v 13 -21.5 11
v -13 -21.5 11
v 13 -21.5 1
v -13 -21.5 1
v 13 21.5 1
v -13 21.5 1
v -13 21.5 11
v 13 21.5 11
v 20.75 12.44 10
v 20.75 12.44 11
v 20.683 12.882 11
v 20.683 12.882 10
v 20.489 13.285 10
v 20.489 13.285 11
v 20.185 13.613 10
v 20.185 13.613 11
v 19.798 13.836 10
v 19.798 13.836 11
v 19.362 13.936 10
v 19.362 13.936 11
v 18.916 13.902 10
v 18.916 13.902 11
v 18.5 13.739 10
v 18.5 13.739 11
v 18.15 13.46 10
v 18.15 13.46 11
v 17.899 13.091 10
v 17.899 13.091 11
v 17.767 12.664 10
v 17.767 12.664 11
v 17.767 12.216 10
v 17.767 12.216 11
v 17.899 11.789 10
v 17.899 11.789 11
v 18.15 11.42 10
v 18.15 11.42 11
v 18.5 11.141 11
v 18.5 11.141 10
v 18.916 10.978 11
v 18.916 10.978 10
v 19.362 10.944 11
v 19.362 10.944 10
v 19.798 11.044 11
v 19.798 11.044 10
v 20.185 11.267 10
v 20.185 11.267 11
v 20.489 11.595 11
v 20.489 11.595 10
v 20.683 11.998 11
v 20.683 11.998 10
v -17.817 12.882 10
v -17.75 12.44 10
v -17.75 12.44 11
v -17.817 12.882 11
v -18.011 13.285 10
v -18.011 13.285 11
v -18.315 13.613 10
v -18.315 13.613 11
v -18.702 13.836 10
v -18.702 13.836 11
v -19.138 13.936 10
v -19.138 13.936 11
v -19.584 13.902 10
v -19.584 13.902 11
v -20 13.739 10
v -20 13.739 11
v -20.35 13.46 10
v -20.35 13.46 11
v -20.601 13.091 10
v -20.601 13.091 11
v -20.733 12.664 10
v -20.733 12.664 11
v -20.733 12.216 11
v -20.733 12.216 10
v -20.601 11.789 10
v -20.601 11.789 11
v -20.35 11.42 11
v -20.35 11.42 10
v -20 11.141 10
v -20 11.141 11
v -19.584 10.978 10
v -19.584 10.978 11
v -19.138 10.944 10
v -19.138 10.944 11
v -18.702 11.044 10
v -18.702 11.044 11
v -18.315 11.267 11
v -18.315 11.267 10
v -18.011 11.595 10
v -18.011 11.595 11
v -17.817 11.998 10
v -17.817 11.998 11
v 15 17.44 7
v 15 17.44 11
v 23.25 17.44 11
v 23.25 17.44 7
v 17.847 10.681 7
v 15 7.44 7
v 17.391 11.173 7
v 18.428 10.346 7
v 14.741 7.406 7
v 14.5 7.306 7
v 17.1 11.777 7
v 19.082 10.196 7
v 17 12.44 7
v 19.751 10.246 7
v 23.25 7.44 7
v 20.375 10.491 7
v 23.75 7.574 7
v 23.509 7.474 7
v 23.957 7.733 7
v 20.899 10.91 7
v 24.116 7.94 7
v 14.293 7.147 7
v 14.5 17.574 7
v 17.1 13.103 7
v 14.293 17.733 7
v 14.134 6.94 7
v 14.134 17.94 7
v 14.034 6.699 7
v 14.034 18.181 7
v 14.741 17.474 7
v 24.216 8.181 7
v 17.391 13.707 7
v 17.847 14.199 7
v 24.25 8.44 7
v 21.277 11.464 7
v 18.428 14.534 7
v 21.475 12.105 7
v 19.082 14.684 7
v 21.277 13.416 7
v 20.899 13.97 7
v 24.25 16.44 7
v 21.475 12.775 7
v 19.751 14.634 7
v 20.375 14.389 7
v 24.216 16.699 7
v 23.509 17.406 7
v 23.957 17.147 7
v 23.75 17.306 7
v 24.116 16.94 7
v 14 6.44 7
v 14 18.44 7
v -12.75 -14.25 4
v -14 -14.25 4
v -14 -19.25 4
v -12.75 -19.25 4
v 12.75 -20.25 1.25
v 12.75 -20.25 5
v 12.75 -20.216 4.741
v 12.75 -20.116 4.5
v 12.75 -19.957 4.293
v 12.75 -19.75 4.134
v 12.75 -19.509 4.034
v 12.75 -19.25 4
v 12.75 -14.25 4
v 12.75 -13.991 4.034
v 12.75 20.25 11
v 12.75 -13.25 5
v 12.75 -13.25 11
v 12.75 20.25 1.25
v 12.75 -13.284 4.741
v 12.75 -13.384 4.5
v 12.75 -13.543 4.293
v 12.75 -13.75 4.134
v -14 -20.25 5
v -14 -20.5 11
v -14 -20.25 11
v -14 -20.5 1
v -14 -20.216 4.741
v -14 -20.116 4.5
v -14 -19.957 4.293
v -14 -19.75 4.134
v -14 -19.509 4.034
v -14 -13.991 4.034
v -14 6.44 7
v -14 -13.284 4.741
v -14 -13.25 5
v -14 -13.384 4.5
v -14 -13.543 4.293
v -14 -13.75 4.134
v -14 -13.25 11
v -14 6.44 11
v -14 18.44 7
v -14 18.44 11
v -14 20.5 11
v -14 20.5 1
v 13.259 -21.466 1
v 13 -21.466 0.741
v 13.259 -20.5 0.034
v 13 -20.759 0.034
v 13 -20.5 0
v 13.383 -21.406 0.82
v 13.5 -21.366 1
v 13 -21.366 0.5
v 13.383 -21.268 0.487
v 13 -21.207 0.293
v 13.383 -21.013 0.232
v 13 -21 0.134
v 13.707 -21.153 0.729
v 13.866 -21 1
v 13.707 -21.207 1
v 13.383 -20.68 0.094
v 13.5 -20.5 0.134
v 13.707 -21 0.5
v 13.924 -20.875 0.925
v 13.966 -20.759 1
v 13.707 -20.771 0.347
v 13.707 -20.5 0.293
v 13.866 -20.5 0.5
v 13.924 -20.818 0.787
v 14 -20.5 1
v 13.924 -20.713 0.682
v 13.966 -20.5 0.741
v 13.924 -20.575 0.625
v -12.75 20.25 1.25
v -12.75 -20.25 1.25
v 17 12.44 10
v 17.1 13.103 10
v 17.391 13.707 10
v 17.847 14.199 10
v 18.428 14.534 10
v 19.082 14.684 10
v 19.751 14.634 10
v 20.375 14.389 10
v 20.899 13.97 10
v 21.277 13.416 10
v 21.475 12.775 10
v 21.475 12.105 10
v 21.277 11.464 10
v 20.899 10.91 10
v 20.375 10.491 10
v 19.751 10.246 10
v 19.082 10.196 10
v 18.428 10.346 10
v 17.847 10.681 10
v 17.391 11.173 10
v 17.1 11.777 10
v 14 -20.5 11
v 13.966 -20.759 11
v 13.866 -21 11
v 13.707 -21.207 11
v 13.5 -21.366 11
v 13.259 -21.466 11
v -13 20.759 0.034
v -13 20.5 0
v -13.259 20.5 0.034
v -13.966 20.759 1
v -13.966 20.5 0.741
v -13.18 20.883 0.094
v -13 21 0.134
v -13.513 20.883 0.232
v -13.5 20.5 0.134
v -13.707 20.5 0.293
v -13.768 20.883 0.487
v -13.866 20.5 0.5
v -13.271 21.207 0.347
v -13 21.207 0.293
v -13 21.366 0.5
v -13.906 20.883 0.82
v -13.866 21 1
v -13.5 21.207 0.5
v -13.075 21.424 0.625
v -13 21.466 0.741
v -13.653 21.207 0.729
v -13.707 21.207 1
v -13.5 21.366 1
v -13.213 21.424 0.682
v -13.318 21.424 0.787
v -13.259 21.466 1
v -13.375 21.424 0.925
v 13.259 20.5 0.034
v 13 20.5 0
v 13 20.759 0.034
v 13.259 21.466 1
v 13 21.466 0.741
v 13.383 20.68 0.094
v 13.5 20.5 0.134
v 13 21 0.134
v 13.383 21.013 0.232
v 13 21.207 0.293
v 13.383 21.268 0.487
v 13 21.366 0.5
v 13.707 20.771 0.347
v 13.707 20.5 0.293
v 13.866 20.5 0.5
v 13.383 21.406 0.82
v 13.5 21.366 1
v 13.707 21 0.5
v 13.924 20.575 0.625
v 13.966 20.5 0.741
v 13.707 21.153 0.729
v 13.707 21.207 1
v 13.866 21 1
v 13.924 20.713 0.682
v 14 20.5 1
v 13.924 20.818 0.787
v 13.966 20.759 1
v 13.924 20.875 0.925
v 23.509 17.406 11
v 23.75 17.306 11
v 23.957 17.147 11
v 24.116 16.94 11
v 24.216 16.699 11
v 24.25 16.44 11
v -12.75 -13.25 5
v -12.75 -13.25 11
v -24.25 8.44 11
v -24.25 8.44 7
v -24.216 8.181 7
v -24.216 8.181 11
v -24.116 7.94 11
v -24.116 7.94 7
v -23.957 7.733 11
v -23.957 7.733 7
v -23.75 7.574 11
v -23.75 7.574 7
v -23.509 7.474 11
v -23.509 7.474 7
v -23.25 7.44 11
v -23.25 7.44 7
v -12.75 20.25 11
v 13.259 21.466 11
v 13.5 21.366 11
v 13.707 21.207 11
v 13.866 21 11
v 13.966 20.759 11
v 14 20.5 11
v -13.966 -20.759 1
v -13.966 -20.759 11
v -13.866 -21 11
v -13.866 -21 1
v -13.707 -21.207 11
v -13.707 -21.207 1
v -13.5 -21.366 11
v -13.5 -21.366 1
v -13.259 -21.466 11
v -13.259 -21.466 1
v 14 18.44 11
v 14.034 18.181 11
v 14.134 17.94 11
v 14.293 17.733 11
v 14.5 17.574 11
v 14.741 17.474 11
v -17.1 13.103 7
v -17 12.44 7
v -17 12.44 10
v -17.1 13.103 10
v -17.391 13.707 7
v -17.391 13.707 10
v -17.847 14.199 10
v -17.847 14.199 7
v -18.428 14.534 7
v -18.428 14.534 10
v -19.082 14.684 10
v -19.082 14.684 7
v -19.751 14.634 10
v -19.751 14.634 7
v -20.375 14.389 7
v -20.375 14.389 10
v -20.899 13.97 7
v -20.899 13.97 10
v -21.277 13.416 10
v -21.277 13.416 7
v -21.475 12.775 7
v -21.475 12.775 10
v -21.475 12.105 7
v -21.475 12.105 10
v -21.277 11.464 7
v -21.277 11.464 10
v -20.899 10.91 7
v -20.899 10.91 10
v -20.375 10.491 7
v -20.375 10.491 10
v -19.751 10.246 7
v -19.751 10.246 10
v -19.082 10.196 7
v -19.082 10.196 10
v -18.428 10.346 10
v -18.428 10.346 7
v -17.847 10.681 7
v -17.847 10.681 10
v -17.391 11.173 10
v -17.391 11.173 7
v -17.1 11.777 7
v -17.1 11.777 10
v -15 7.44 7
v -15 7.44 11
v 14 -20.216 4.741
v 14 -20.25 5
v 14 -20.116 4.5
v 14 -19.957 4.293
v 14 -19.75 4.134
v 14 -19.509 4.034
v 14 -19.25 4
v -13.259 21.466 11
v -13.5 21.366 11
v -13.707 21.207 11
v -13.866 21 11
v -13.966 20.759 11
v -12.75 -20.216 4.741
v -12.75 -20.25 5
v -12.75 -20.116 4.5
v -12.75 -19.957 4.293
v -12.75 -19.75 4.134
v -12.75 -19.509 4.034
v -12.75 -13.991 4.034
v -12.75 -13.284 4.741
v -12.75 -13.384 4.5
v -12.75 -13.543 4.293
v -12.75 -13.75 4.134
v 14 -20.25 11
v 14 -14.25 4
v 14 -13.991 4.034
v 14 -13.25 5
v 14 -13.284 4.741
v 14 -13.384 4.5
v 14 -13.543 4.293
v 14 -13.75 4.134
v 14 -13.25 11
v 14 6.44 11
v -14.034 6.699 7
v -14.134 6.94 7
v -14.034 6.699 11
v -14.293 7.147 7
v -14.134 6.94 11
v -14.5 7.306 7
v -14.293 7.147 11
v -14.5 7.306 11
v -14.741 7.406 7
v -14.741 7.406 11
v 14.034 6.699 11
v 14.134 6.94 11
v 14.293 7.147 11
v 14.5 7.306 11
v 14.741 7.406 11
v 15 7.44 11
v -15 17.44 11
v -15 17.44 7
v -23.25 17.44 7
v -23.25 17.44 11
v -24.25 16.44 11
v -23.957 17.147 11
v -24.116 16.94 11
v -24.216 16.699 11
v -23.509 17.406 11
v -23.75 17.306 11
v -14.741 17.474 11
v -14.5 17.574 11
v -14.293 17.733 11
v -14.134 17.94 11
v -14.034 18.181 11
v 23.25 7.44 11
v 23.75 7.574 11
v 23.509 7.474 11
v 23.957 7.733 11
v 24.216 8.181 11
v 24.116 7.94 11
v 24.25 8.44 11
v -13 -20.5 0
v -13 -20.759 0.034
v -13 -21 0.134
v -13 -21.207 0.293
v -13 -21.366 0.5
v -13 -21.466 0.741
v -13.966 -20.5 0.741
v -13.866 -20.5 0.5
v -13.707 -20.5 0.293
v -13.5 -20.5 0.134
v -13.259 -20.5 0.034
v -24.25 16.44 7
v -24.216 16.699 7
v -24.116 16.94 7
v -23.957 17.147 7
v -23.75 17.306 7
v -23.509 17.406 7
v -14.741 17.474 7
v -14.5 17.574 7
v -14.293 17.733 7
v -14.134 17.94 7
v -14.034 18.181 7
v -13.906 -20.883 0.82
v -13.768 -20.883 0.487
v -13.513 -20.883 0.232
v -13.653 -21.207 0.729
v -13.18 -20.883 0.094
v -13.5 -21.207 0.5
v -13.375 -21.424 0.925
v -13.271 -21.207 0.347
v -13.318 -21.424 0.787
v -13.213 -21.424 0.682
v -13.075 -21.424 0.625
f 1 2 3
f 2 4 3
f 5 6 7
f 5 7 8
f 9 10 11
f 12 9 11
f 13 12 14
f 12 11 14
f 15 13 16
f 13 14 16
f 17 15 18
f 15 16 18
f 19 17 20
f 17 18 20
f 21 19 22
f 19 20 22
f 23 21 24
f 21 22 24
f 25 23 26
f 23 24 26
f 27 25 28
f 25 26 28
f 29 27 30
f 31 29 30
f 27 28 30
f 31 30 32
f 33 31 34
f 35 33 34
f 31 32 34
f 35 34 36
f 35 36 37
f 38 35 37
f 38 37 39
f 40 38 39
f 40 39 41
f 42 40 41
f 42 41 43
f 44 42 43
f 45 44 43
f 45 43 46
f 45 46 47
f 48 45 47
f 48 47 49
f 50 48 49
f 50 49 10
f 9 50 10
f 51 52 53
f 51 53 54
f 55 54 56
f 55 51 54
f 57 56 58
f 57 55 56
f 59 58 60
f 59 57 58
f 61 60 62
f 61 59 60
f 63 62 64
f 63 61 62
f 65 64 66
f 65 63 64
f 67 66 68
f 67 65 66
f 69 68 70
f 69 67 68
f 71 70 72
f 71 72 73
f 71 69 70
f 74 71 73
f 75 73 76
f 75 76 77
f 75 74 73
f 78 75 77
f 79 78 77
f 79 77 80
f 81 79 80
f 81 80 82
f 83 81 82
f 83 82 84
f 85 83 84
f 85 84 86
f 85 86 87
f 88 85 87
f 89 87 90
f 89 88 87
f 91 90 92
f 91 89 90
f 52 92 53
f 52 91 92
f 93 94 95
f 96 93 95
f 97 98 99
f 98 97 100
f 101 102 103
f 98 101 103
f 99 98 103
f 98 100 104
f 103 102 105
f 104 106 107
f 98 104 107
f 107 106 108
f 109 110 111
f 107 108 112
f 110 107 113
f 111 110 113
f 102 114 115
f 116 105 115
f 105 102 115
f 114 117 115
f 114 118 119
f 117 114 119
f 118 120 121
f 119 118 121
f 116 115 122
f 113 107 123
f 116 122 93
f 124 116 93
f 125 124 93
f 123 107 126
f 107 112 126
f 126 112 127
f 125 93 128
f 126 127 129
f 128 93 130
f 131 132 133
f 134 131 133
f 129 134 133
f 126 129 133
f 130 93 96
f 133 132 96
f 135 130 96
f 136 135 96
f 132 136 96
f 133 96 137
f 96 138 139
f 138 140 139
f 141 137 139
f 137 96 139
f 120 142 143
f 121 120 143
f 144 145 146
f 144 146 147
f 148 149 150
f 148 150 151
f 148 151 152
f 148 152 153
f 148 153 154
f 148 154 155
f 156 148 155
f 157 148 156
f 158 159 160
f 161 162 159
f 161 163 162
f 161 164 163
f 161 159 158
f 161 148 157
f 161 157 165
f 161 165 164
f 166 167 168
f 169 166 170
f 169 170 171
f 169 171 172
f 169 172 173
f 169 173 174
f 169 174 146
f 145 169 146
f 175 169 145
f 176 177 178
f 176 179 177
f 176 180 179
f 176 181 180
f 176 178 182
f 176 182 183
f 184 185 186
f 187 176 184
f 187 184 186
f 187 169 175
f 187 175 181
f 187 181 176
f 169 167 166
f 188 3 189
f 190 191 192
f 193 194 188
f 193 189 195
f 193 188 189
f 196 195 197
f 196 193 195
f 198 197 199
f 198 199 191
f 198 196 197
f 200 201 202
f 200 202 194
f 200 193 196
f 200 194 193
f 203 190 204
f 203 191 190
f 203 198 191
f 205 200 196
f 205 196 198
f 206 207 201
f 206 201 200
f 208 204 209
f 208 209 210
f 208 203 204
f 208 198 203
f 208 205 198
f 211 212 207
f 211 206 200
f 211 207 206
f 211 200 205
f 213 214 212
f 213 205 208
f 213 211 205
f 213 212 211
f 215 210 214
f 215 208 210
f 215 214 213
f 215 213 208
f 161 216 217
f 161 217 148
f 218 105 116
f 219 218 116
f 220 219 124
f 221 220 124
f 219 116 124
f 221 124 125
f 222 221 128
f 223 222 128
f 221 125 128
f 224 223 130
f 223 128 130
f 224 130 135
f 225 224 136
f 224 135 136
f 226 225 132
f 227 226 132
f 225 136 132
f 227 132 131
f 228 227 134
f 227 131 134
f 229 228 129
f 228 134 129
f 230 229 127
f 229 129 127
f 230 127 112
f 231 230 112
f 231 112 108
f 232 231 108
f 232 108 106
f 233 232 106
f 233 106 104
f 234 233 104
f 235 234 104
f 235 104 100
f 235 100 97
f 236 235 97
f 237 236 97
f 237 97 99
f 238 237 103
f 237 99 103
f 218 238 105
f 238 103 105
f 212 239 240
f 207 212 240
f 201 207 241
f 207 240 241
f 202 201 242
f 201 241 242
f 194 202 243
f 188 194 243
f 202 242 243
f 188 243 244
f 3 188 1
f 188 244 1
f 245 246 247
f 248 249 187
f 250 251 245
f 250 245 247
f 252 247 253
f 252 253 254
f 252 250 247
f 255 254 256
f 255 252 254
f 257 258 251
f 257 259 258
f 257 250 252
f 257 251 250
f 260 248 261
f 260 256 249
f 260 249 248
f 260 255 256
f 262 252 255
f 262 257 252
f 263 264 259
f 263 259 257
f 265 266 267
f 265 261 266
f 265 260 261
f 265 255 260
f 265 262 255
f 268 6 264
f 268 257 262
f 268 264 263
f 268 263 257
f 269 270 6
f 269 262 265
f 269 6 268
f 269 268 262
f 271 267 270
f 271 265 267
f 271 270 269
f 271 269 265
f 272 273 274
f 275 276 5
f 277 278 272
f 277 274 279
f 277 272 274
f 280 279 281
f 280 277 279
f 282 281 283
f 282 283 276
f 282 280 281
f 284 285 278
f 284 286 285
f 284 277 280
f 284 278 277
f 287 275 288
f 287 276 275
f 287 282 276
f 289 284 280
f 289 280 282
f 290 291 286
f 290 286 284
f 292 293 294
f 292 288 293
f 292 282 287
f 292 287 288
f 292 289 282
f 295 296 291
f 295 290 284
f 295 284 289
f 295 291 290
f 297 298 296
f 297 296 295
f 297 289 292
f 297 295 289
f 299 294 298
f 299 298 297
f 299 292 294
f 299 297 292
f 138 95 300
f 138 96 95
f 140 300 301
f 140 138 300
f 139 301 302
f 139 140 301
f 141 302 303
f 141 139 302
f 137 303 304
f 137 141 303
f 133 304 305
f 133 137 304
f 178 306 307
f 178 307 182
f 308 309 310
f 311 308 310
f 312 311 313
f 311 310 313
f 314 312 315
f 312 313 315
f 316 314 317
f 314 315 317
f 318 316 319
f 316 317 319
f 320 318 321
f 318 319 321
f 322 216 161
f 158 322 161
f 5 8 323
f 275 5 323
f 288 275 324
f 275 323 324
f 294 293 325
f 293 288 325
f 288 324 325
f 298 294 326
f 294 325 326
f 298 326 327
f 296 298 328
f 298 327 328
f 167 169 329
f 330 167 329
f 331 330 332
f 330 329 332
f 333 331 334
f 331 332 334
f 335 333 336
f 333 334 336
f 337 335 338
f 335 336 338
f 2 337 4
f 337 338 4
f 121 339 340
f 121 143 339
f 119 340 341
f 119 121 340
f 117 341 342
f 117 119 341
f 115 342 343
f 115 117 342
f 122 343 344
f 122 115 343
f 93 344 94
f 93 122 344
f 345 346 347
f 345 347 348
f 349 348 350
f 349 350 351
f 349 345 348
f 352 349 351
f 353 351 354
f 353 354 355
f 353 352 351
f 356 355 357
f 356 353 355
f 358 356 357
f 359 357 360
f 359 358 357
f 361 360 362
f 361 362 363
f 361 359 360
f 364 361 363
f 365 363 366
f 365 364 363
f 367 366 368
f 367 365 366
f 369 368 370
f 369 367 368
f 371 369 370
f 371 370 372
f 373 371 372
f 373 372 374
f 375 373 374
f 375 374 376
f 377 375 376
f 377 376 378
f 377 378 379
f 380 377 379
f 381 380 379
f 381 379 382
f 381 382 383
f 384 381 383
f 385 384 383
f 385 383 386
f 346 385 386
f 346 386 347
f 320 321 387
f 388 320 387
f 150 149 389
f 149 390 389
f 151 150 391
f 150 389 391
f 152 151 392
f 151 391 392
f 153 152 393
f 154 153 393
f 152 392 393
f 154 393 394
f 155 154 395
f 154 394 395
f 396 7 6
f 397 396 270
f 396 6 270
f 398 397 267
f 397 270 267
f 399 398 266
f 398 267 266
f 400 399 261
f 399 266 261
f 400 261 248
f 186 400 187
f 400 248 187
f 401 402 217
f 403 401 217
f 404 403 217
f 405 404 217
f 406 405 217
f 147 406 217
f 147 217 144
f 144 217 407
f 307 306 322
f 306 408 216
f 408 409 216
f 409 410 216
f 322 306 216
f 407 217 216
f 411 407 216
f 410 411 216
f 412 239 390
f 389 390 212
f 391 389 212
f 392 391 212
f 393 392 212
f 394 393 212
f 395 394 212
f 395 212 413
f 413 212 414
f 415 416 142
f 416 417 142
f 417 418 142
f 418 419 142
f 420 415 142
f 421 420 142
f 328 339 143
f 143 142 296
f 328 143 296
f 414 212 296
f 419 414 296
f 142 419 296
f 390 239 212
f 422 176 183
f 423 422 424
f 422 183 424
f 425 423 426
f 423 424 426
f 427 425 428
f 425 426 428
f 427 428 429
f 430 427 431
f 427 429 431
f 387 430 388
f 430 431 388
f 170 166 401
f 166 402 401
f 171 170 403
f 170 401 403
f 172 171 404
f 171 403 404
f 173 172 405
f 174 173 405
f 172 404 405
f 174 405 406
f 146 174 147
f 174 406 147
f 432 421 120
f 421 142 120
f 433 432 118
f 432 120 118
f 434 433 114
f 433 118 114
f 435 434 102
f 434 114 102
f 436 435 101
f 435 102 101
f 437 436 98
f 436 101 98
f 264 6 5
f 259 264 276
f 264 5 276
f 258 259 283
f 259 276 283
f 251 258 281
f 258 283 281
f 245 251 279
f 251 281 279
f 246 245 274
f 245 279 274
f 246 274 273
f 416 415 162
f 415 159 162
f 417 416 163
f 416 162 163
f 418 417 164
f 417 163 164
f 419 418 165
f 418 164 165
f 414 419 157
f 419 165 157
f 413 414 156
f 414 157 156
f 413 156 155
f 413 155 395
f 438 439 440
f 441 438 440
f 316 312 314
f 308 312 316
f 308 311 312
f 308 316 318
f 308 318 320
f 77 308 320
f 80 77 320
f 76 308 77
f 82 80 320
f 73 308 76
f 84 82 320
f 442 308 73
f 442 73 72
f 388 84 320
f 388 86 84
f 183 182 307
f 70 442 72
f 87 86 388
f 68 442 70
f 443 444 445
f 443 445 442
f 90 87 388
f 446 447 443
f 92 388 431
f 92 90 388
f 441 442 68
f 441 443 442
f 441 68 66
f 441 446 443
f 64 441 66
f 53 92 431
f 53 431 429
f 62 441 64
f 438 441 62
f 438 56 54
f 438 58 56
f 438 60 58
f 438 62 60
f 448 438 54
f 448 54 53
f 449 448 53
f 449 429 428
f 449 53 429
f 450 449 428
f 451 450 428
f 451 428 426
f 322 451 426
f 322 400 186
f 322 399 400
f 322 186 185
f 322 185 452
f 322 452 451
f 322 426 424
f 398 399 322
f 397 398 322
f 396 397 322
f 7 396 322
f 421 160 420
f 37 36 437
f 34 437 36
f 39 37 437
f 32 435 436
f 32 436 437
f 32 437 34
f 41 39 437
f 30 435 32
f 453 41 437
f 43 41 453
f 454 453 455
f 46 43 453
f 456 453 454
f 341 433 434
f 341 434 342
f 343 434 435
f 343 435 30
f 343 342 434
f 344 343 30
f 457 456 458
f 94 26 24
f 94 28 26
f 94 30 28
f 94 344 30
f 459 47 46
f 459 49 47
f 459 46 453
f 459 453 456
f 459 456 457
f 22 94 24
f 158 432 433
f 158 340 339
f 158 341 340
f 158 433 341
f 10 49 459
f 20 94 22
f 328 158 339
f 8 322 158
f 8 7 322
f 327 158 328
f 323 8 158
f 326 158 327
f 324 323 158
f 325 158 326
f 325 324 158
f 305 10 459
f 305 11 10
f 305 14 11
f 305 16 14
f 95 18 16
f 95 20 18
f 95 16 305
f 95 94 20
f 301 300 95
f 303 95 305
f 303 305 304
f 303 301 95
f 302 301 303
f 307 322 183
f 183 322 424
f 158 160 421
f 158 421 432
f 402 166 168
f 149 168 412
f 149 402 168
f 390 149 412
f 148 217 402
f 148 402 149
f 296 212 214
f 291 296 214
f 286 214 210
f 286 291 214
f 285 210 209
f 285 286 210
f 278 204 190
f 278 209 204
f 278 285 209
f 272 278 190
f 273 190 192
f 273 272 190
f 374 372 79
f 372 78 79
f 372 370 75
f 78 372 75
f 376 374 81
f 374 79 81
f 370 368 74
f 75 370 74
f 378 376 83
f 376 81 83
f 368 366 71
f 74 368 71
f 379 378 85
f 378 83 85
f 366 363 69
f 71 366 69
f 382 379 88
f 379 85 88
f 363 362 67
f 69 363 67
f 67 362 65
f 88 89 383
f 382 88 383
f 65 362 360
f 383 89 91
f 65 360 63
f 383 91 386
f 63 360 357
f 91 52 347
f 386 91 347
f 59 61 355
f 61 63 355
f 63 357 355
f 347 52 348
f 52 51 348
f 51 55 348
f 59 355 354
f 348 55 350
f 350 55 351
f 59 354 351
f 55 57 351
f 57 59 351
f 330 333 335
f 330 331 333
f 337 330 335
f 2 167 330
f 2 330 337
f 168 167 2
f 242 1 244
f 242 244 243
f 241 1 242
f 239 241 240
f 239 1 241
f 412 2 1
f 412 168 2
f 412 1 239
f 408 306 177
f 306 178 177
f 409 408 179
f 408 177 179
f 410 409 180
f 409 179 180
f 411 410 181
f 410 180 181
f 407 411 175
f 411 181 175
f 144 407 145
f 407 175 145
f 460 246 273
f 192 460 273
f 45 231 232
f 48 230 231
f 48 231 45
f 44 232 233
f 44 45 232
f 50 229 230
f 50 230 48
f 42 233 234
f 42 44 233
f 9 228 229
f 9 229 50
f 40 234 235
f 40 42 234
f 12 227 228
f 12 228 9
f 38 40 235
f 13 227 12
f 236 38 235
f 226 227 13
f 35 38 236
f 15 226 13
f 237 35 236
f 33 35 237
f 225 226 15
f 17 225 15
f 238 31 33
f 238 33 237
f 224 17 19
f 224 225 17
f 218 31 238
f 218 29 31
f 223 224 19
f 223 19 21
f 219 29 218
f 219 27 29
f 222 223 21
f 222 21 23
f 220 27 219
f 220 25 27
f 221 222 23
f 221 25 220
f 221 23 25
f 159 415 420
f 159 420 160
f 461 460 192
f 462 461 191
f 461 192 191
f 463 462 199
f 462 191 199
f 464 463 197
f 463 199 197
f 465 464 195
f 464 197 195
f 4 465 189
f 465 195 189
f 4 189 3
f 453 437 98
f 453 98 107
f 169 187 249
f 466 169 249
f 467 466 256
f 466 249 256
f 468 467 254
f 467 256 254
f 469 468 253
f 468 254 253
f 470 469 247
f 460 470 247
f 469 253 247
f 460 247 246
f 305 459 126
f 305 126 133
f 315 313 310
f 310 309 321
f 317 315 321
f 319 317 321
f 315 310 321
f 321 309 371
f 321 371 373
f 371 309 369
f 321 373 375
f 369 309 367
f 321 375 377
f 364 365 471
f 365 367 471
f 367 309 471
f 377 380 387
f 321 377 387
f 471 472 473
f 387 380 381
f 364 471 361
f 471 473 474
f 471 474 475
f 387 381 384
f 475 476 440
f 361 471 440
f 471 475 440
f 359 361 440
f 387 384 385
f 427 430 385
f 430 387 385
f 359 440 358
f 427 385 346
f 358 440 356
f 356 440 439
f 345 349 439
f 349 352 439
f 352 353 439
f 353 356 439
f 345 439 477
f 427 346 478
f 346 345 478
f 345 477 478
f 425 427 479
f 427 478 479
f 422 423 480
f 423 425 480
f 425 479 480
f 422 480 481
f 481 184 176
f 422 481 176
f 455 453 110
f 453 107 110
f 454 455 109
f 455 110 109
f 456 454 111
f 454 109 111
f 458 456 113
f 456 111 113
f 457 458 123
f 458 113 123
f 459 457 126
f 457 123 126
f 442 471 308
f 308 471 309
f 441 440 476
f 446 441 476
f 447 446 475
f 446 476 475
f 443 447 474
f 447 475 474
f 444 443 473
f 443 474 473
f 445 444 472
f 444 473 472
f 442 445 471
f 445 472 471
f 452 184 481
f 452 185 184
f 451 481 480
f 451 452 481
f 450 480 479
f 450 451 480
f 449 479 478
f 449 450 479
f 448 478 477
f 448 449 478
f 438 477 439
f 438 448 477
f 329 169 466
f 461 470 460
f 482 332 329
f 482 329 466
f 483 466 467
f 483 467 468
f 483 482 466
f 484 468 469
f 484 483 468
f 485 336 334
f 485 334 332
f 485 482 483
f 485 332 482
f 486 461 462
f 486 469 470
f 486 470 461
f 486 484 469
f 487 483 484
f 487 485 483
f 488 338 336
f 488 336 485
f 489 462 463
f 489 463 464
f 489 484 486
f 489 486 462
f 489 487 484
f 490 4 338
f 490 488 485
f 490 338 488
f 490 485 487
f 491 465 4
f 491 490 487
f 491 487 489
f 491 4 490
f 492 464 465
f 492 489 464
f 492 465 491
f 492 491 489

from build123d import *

# Parameters (mm, degrees)
SKETCH1_W             = 28
SKETCH1_H             = 43
BOSS_EXTRUDE1_DEPTH   = 1.25
SKETCH2_W             = 28
SKETCH2_H             = 43
SKETCH2_W_2           = 25.5
SKETCH2_H_2           = 40.5
BOSS_EXTRUDE2_DEPTH   = 2.75
SKETCH4_W             = 28
SKETCH4_H             = 1.25
BOSS_EXTRUDE3_DEPTH   = 7
SKETCH12_W            = 10.25
SKETCH12_H            = 10
SKETCH12_R            = 1.5
BOSS_EXTRUDE5_DEPTH   = 4
FILLET3_R             = 1
SKETCH13_R            = 2.25
CUT_EXTRUDE2_DEPTH    = 3
MIRROR1_START         = 7
MIRROR1_OUTLINE_R     = 2.25
MIRROR1_DEPTH         = 4
MIRROR1_START_2       = 10
MIRROR1_2_OUTLINE_R   = 2.25
MIRROR1_2_OUTLINE_R_2 = 1.5
MIRROR1_2_DEPTH       = 1
FILLET4_R             = 1
FILLET5_R             = 1
FILLET6_R             = 1
FILLET7_R             = 1


# Read off the part's stored shape, not the designer's step: Mirror1
with BuildPart() as part:
    # Sketch1 → Boss-Extrude1 (new body)
    with BuildSketch(Plane.XY):
        Rectangle(SKETCH1_W, SKETCH1_H)
    extrude(amount=BOSS_EXTRUDE1_DEPTH)

    # Sketch2 → Boss-Extrude2 (add)
    with BuildSketch(Plane.XY.offset(1.25)):
        Rectangle(SKETCH2_W, SKETCH2_H)
        Rectangle(SKETCH2_W_2, SKETCH2_H_2, mode=Mode.SUBTRACT)
    extrude(amount=BOSS_EXTRUDE2_DEPTH)

    # Sketch4 → Boss-Extrude3 (add)
    with BuildSketch(Plane.XY.offset(4)):
        with Locations((0, -20.875)):
            Rectangle(SKETCH4_W, SKETCH4_H)
        Polygon((12.75, -13.25), (12.75, 20.25), (-12.75, 20.25), (-12.75, -13.25), (-14, -13.25), (-14, 21.5), (14, 21.5), (14, -13.25), align=None)
    extrude(amount=BOSS_EXTRUDE3_DEPTH)

    # Sketch12 → Boss-Extrude5 (add)
    with BuildSketch(Plane.XY.offset(11)):
        with Locations((19.125, 12.44)):
            Rectangle(SKETCH12_W, SKETCH12_H)
        with Locations((19.25, 12.44)):
            Circle(SKETCH12_R, mode=Mode.SUBTRACT)
    extrude(amount=-BOSS_EXTRUDE5_DEPTH)

    # Fillet3
    fillet3_edges = [part.edges().sort_by_distance(p)[0] for p in [
        (14, 7.44, 9),
        (14, 17.44, 9),
        (24.25, 17.44, 9),
        (24.25, 7.44, 9),
    ]]
    fillet(fillet3_edges, radius=FILLET3_R)

    # Sketch13 → Cut-Extrude2 (cut)
    with BuildSketch(Plane(origin=(0, 0, 7), x_dir=(-1, 0, 0), z_dir=(0, 0, -1))):
        with Locations((-19.25, 12.44)):
            Circle(SKETCH13_R)
    extrude(amount=-CUT_EXTRUDE2_DEPTH, mode=Mode.SUBTRACT)

    # Mirror1 outline → Mirror1 (add)
    with BuildSketch(Plane.XY.offset(MIRROR1_START)):
        with BuildLine():
            Line((-14, 17.44), (-23.25, 17.44))
            ThreePointArc((-23.25, 17.44), (-23.957106781, 17.147106781), (-24.25, 16.44))
            Line((-24.25, 16.44), (-24.25, 8.44))
            ThreePointArc((-24.25, 8.44), (-23.957106781, 7.732893219), (-23.25, 7.44))
            Line((-23.25, 7.44), (-14, 7.44))
            Line((-14, 7.44), (-14, 17.44))
        make_face()
        with Locations((-19.25, 12.44)):
            Circle(MIRROR1_OUTLINE_R, mode=Mode.SUBTRACT)
    extrude(amount=MIRROR1_DEPTH)

    # Mirror1 2 outline → Mirror1 2 (add)
    with BuildSketch(Plane.XY.offset(MIRROR1_START_2)):
        with Locations((-19.25, 12.44)):
            Circle(MIRROR1_2_OUTLINE_R)
        with Locations((-19.25, 12.44)):
            Circle(MIRROR1_2_OUTLINE_R_2, mode=Mode.SUBTRACT)
    extrude(amount=MIRROR1_2_DEPTH)

    # Fillet4
    fillet4_edges = [part.edges().sort_by_distance(p)[0] for p in [
        (-13.375, -20.25, 4),
        (13.375, -13.25, 4),
        (-13.375, -13.25, 4),
        (13.375, -20.25, 4),
    ]]
    fillet(fillet4_edges, radius=FILLET4_R)

    # Fillet5
    fillet5_edges = [part.edges().sort_by_distance(p)[0] for p in [
        (0, 21.5, 0),
        (14, 0, 0),
        (0, -21.5, 0),
        (-14, 0, 0),
    ]]
    fillet(fillet5_edges, radius=FILLET5_R)

    # Fillet6
    # the kernel refuses this fillet: 1 mm, written as the material it takes off along each edge
    with BuildSketch(Plane(origin=(13, -20.5, 1), x_dir=(0, -1, 0), z_dir=(1, 0, 0))) as fillet6_piece_1_section:
        Polygon((0, 0), (FILLET6_R, 0), (FILLET6_R, FILLET6_R), (0, FILLET6_R), align=None)
    fillet6_piece_1 = extrude(amount=FILLET6_R, mode=Mode.PRIVATE)
    fillet6_piece_1 = fillet6_piece_1 - Plane(origin=(13, -20.5, 1), x_dir=(0, 0.7071067811865475, 0.7071067811865475), z_dir=(1, 0, 0)) * Sphere(FILLET6_R, mode=Mode.PRIVATE)
    add(fillet6_piece_1, mode=Mode.SUBTRACT)
    with BuildSketch(Plane(origin=(-13, -20.5, 1), x_dir=(-1, 0, 0), z_dir=(0, -1, 0))) as fillet6_piece_2_section:
        Polygon((0, 0), (FILLET6_R, 0), (FILLET6_R, FILLET6_R), (0, FILLET6_R), align=None)
    fillet6_piece_2 = extrude(amount=FILLET6_R, mode=Mode.PRIVATE)
    fillet6_piece_2 = fillet6_piece_2 - Plane(origin=(-13, -20.5, 1), x_dir=(0.7071067811865475, 0, 0.7071067811865475), z_dir=(0, -1, 0)) * Sphere(FILLET6_R, mode=Mode.PRIVATE)
    add(fillet6_piece_2, mode=Mode.SUBTRACT)
    with BuildSketch(Plane(origin=(13, 20.5, 1), x_dir=(0, 1, 0), z_dir=(1, 0, 0))) as fillet6_piece_3_section:
        Polygon((0, 0), (FILLET6_R, 0), (FILLET6_R, -FILLET6_R), (0, -FILLET6_R), align=None)
    fillet6_piece_3 = extrude(amount=FILLET6_R, mode=Mode.PRIVATE)
    fillet6_piece_3 = fillet6_piece_3 - Plane(origin=(13, 20.5, 1), x_dir=(0, -0.7071067811865475, 0.7071067811865475), z_dir=(1, 0, 0)) * Sphere(FILLET6_R, mode=Mode.PRIVATE)
    add(fillet6_piece_3, mode=Mode.SUBTRACT)
    with BuildSketch(Plane(origin=(-13, 20.5, 1), x_dir=(-1, 0, 0), z_dir=(0, 1, 0))) as fillet6_piece_4_section:
        Polygon((0, 0), (FILLET6_R, 0), (FILLET6_R, -FILLET6_R), (0, -FILLET6_R), align=None)
    fillet6_piece_4 = extrude(amount=FILLET6_R, mode=Mode.PRIVATE)
    fillet6_piece_4 = fillet6_piece_4 - Plane(origin=(-13, 20.5, 1), x_dir=(0.7071067811865475, 0, 0.7071067811865475), z_dir=(0, 1, 0)) * Sphere(FILLET6_R, mode=Mode.PRIVATE)
    add(fillet6_piece_4, mode=Mode.SUBTRACT)
    with BuildSketch(Plane(origin=(-14, 21.5, 1), x_dir=(1, 0, 0), z_dir=(0, 0, 1)), Plane(origin=(14, -21.5, 13.5), x_dir=(0, 1, 0), z_dir=(0, 0, -1))) as fillet6_piece_5:
        with BuildLine():
            CenterArc((FILLET6_R, -FILLET6_R), FILLET6_R, 90, 90)
            Line((0, -FILLET6_R), (0, 0))
            Line((0, 0), (FILLET6_R, 0))
        make_face()
    extrude(amount=12.5, mode=Mode.SUBTRACT)
    with BuildSketch(Plane(origin=(14, 21.5, 13.5), x_dir=(0, -1, 0), z_dir=(0, 0, -1)), Plane(origin=(-14, -21.5, 1), x_dir=(1, 0, 0), z_dir=(0, 0, 1))) as fillet6_piece_6:
        with BuildLine():
            CenterArc((FILLET6_R, FILLET6_R), FILLET6_R, 180, 90)
            Line((0, FILLET6_R), (0, 0))
            Line((0, 0), (FILLET6_R, 0))
        make_face()
    extrude(amount=12.5, mode=Mode.SUBTRACT)

    # Fillet7
    fillet7_edges = [part.edges().sort_by_distance(p)[0] for p in [
        (-14, 17.44, 9),
        (-14, 7.44, 9),
    ]]
    fillet(fillet7_edges, radius=FILLET7_R)


solid = part.part
